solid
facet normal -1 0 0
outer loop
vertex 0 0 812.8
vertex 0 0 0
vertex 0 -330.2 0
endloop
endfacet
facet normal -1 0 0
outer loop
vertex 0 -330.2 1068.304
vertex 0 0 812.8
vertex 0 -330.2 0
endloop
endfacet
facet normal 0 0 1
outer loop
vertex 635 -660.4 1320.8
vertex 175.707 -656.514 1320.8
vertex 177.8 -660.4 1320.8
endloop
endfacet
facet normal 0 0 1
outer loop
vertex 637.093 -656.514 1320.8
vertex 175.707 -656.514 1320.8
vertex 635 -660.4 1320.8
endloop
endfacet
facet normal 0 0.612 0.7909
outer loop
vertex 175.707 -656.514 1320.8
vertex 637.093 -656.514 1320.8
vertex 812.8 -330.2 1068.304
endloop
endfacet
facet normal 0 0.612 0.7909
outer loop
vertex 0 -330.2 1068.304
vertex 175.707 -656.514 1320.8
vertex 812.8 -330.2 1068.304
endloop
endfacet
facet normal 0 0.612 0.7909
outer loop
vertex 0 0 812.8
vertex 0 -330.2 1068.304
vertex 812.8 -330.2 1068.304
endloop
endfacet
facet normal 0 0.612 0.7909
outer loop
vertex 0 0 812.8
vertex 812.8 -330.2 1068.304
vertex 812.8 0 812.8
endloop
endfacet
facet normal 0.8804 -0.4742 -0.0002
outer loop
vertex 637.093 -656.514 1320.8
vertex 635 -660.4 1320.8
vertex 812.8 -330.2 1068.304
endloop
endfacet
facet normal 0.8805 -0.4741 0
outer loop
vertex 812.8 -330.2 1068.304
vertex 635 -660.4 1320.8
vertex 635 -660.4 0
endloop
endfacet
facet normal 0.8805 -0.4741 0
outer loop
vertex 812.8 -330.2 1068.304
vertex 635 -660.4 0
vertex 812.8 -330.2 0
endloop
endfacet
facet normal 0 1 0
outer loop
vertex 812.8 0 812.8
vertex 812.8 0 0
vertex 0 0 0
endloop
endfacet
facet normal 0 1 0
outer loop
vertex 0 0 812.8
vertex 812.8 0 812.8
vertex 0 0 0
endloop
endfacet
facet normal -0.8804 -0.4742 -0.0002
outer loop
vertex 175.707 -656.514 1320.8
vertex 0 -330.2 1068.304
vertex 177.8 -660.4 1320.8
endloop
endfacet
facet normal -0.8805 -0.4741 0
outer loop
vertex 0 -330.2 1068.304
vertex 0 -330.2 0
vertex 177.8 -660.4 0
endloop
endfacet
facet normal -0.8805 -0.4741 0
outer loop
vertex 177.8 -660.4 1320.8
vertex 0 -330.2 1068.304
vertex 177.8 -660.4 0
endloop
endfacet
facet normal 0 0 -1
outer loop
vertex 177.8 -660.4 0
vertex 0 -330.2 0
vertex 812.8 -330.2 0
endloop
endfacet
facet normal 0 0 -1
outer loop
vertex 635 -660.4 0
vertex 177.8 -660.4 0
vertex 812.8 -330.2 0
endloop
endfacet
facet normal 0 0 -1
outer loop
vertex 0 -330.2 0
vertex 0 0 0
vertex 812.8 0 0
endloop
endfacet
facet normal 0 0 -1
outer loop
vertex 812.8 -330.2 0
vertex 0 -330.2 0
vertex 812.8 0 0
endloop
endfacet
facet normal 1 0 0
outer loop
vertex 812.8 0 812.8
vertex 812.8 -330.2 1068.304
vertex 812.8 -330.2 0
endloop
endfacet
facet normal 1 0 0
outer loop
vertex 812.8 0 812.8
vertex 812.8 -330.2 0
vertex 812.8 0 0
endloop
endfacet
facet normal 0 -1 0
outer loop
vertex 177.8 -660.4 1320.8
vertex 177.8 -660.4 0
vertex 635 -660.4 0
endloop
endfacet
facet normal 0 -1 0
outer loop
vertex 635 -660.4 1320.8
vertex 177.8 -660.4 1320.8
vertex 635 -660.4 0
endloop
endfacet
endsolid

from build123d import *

# Parameters (mm, degrees)
F1_DEPTH = 1320.8
F3_DEPTH = 812.801


with BuildPart() as f1:
    # F0 (on Top) → F1 (new body)
    with BuildSketch(Plane.XY):
        Polygon((812.8, 0), (0, 0), (0, -330.2), (177.8, -660.4), (635, -660.4), (812.8, -330.2), align=None)
    extrude(amount=F1_DEPTH)

    # F2 (on face) → F3 (cut, through all)
    with BuildSketch(Plane.YZ.offset(812.8)):
        Polygon((0, 1320.8), (-660.393178, 1323.801782), (0, 812.8), align=None)
    extrude(amount=-F3_DEPTH, mode=Mode.SUBTRACT)


solid = f1.part
